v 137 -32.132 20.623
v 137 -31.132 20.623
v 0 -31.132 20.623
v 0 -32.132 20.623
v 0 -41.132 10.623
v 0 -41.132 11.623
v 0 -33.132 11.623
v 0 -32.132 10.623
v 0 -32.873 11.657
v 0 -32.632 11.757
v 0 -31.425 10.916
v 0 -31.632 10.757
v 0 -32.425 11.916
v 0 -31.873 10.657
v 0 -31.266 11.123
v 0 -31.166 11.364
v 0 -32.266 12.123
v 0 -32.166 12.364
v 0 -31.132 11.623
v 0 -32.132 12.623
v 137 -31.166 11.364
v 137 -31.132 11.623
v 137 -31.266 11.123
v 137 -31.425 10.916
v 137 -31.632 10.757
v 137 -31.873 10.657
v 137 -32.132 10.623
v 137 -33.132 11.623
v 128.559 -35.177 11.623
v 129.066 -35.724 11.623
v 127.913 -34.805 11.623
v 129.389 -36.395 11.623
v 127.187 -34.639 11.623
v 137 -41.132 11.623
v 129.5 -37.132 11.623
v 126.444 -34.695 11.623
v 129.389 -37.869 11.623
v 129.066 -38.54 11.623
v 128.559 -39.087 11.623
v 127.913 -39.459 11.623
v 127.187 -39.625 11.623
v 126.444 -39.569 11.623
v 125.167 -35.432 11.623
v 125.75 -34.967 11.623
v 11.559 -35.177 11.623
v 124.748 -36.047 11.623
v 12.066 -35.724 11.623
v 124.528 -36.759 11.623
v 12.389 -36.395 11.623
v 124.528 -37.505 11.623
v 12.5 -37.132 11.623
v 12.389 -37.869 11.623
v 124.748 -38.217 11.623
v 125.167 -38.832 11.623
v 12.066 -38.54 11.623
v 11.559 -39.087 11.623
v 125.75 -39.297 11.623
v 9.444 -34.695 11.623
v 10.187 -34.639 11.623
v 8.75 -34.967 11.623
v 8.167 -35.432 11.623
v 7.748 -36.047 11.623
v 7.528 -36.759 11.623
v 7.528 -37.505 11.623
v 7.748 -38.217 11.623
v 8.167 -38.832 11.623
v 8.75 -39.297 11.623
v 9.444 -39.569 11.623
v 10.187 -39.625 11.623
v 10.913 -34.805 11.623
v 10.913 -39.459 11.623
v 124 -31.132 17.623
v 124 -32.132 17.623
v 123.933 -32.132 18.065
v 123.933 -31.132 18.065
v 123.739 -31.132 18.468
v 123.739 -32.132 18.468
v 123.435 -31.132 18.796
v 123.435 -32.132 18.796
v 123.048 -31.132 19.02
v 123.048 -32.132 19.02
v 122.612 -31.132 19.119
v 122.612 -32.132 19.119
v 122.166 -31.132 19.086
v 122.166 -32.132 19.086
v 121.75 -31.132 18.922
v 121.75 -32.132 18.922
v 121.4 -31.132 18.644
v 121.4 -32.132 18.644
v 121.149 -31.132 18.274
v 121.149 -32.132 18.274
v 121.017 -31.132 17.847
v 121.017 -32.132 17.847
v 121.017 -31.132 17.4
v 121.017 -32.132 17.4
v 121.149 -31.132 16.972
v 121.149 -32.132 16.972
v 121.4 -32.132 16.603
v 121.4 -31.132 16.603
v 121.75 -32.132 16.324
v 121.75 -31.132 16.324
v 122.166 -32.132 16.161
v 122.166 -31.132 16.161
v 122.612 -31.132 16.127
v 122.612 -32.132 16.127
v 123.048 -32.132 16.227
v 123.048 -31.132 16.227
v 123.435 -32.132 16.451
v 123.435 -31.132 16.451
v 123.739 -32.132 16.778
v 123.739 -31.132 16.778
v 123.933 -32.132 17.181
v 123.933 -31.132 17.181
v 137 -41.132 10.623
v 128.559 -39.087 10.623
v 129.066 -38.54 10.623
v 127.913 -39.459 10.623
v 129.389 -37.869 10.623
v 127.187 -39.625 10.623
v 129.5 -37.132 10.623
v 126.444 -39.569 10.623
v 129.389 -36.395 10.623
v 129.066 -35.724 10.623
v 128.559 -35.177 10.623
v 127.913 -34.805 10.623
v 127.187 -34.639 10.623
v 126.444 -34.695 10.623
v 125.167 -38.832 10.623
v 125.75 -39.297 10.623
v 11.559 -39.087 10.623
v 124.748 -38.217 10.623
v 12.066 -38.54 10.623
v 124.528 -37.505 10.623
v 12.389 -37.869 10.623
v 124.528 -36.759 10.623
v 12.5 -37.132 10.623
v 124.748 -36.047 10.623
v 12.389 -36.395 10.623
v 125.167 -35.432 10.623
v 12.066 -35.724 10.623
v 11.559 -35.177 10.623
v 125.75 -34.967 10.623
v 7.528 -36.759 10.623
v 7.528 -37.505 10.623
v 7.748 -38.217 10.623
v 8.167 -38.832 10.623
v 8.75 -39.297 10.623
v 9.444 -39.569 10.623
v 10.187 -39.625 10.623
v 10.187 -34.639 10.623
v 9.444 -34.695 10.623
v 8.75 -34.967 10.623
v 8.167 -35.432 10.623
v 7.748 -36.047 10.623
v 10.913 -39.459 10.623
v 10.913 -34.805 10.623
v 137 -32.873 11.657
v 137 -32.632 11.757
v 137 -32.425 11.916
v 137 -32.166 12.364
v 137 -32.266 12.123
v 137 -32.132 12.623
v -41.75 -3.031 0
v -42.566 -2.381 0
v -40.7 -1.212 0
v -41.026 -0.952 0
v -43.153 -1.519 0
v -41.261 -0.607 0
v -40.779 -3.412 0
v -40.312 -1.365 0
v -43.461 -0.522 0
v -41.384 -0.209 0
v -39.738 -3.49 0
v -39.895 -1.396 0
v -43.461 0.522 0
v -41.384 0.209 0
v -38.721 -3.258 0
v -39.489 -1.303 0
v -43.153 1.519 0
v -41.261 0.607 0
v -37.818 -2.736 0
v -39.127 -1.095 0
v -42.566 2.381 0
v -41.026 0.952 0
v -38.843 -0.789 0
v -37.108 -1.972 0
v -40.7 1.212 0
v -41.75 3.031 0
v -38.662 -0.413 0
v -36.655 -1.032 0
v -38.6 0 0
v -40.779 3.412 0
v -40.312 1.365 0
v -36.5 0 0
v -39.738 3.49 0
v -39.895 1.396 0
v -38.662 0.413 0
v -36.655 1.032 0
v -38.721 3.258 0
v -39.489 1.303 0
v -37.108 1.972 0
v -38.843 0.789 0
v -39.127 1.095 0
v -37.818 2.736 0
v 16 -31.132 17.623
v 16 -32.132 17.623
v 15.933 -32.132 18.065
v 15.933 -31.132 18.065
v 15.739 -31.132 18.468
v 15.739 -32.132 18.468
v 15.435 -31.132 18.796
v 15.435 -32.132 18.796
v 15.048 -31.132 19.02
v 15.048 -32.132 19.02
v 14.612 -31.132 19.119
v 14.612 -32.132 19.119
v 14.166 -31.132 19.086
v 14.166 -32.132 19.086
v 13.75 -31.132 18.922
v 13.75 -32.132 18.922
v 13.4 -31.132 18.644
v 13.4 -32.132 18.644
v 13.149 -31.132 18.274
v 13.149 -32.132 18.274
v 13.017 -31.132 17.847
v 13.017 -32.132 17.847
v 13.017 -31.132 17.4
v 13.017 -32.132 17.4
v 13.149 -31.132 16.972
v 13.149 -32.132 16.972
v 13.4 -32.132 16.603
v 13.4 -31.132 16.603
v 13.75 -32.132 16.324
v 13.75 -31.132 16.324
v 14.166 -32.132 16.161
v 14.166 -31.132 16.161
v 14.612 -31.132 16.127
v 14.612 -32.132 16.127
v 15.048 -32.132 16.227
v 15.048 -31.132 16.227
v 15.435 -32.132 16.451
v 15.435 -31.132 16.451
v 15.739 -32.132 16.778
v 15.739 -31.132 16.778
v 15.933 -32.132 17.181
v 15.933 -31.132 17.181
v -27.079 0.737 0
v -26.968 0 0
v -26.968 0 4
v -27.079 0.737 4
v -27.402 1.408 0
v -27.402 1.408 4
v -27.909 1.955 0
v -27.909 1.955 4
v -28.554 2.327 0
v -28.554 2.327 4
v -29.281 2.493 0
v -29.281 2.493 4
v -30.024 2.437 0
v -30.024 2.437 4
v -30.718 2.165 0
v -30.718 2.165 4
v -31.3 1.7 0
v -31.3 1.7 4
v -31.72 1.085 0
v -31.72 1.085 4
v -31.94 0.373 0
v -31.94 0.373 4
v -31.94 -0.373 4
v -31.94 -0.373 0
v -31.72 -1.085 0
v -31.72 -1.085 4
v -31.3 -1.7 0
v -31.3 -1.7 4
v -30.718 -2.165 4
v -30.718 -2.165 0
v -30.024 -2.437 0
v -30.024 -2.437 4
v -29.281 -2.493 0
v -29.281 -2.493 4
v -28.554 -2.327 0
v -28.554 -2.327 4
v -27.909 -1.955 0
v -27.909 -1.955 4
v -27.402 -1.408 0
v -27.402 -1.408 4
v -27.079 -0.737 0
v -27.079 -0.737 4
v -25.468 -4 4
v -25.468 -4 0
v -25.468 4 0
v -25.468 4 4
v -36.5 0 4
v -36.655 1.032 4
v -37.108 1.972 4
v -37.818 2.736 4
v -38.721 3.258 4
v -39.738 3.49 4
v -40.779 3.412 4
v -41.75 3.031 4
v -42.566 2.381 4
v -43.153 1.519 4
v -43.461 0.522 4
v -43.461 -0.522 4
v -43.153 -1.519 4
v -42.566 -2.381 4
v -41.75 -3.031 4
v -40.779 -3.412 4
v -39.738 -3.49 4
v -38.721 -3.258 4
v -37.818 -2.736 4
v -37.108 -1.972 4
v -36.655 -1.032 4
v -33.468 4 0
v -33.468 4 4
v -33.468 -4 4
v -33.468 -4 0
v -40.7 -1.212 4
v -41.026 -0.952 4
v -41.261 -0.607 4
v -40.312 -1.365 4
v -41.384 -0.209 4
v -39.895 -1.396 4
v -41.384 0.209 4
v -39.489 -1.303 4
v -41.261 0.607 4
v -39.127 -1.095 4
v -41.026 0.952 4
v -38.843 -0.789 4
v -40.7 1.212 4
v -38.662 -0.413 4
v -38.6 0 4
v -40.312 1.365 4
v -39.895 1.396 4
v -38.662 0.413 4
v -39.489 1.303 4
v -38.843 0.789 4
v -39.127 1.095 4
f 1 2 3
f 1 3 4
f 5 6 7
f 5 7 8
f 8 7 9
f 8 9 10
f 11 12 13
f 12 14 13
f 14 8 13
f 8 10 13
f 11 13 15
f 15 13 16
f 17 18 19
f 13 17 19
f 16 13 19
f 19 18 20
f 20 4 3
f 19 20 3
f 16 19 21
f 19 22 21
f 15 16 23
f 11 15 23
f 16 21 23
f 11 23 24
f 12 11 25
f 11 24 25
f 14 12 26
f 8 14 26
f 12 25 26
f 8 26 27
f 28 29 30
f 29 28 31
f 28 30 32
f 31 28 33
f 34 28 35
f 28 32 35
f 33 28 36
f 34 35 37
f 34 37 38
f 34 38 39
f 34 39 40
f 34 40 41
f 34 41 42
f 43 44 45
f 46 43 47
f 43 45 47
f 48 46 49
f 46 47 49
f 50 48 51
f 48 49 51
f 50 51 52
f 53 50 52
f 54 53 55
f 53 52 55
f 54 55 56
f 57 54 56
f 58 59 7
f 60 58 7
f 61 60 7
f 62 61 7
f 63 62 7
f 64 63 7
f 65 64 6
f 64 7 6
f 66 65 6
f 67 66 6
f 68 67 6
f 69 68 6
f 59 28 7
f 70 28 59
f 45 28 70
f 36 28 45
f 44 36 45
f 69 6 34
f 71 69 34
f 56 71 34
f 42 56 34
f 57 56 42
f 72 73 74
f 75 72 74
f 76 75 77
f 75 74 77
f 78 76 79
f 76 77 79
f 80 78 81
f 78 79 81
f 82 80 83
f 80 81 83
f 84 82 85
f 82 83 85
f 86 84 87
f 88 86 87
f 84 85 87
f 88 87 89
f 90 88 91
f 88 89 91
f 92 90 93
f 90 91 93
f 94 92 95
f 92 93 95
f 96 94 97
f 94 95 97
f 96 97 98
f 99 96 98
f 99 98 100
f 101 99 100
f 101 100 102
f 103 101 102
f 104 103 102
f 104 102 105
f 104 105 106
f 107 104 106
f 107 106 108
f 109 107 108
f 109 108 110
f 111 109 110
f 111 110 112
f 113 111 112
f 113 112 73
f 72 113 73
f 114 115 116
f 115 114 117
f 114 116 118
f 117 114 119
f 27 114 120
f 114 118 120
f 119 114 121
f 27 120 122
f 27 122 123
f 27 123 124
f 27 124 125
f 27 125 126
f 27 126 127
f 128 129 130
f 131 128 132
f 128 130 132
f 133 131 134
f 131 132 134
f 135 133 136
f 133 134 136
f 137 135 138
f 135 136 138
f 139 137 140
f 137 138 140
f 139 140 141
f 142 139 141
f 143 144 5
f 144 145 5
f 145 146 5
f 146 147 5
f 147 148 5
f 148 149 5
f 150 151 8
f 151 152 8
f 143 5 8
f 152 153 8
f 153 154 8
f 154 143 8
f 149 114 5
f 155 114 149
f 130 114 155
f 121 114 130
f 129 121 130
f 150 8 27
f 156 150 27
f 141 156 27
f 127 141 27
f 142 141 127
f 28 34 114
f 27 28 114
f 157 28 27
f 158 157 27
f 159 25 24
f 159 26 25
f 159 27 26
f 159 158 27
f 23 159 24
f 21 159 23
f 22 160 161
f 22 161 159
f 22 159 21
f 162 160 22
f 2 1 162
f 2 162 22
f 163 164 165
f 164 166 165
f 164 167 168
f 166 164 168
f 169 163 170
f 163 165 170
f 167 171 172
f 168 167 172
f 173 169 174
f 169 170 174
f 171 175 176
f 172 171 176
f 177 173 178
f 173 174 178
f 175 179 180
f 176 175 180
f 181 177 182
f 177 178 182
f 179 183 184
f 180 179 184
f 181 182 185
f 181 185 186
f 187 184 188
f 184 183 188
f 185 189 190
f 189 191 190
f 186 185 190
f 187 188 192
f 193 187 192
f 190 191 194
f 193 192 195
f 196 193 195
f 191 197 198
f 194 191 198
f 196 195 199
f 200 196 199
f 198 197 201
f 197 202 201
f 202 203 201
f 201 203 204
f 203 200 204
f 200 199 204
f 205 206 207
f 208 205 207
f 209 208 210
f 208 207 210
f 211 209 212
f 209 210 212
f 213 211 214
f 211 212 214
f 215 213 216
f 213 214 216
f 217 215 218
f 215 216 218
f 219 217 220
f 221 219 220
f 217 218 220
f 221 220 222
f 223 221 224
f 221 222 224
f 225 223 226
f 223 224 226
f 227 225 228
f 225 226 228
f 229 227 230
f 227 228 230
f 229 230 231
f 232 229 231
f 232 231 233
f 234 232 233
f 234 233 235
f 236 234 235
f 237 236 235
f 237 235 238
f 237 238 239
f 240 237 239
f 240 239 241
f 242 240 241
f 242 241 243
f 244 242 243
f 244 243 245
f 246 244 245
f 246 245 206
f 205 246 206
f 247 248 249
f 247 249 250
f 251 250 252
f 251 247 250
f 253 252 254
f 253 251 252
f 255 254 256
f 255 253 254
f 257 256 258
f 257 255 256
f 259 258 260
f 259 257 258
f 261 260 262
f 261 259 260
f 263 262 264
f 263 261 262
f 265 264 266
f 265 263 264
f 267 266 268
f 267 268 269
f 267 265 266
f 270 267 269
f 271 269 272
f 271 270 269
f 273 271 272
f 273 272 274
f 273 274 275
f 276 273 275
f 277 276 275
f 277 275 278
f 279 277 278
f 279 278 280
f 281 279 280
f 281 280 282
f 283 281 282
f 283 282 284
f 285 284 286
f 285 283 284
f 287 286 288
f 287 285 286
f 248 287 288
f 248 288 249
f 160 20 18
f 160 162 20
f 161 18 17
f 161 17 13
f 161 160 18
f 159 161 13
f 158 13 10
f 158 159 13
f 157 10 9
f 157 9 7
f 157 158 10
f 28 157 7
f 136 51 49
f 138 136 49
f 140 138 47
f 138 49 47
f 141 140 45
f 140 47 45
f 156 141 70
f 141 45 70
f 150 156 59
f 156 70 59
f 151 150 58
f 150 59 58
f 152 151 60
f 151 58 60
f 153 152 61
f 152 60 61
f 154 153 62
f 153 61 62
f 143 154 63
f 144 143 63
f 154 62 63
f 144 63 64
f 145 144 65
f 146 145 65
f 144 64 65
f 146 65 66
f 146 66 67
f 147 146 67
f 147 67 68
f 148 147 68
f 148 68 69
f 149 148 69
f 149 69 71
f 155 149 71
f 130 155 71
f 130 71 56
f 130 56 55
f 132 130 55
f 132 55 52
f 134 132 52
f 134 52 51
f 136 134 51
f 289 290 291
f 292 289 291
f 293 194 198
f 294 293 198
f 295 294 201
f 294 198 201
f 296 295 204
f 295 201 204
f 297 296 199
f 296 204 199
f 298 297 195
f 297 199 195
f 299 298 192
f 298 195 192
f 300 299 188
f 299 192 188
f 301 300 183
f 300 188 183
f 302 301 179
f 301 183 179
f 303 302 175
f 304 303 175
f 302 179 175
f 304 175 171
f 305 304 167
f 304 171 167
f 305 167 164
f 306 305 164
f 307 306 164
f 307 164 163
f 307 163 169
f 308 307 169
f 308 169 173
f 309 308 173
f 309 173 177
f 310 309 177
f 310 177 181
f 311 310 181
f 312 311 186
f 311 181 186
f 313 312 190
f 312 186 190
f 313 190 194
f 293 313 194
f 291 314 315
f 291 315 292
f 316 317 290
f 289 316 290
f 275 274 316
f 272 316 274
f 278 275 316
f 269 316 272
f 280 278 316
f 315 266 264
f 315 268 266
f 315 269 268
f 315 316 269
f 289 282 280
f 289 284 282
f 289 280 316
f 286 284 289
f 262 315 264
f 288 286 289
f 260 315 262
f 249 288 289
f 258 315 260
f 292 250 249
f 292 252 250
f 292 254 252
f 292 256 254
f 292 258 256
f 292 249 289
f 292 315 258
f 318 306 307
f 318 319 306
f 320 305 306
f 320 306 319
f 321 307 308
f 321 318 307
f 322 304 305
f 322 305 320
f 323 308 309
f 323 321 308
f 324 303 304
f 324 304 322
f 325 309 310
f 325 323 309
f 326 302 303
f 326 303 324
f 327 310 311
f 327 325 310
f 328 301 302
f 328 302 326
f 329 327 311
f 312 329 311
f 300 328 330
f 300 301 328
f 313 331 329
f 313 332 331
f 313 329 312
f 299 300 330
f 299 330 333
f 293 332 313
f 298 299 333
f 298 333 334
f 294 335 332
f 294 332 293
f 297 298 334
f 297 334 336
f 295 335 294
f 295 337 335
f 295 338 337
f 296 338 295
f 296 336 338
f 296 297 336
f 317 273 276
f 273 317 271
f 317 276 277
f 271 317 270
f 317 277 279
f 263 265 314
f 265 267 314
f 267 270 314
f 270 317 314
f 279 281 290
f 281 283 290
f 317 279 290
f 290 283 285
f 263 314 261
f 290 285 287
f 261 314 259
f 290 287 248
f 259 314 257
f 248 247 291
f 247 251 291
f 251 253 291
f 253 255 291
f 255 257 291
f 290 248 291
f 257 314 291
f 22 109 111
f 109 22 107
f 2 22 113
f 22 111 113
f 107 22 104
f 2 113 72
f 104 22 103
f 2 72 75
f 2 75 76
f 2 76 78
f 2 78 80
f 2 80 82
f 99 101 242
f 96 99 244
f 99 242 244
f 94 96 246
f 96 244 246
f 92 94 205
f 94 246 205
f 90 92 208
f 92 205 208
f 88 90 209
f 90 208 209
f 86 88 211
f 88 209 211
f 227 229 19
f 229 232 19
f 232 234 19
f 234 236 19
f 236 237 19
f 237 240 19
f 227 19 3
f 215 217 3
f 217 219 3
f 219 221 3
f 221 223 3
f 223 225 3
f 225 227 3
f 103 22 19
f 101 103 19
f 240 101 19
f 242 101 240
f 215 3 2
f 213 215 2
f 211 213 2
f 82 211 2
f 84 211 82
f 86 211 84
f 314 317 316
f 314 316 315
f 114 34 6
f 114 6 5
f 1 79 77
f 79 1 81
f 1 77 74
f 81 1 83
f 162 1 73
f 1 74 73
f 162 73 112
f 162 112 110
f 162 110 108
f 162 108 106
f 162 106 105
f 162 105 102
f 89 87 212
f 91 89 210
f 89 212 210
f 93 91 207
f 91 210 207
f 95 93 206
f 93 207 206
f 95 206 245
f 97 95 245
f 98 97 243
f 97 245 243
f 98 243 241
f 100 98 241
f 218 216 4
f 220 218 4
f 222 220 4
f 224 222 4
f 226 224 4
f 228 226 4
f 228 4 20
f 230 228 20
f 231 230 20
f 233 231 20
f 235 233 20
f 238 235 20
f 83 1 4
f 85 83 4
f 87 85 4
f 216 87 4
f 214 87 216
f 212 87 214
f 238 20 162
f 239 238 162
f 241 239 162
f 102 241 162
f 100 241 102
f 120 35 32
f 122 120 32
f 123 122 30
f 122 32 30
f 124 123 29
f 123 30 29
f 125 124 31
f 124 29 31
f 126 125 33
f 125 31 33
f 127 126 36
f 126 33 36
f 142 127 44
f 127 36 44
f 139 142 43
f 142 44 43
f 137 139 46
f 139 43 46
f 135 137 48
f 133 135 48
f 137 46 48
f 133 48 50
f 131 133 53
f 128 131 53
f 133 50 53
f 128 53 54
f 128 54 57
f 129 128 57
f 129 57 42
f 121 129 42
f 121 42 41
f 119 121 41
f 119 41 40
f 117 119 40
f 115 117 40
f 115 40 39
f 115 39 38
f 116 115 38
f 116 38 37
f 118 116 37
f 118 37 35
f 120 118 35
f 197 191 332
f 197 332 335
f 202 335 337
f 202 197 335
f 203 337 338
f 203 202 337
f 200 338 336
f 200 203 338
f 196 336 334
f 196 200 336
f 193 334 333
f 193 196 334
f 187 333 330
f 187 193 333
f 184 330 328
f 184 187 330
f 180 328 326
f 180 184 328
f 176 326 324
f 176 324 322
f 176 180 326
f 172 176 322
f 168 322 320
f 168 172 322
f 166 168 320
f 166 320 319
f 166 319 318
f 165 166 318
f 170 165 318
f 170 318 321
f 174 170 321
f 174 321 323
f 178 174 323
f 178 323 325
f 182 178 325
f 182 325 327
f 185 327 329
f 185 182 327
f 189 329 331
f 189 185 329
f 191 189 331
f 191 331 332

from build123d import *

# Parameters (mm, degrees)
F1_DEPTH  = 137
F2_R      = 1.5
F3_DEPTH  = 2
F4_R      = 2.5
F5_DEPTH  = 2
F6_R      = 1
F7_W      = 8
F7_H      = 8
F7_R      = 2.5
F8_DEPTH  = 4
F9_R      = 3.5
F9_R_2    = 1.4
F10_DEPTH = 4


with BuildPart() as f1:
    # F0 (on Right) → F1 (new body)
    with BuildSketch(Plane.YZ):
        Polygon((-31.131944, 10.623299), (-31.131944, 20.623299), (-32.131944, 20.623299), (-32.131944, 11.623299), (-41.131944, 11.623299), (-41.131944, 10.623299), align=None)
    extrude(amount=F1_DEPTH)

    # F2 (on face) → F3 (cut)
    with BuildSketch(Plane.XZ.offset(32.131944)):
        with Locations((14.5, 17.623299)):
            Circle(F2_R)
        with Locations((122.5, 17.623299)):
            Circle(F2_R)
    extrude(amount=-F3_DEPTH, mode=Mode.SUBTRACT)

    # F4 (on face) → F5 (cut)
    with BuildSketch(Plane.XY.offset(11.623299)):
        with Locations((10, -37.131944)):
            Circle(F4_R)
        with Locations((127, -37.131944)):
            Circle(F4_R)
    extrude(amount=-F5_DEPTH, mode=Mode.SUBTRACT)

    # F6
    f6_edges = [f1.edges().sort_by_distance(p)[0] for p in [
        (68.5, -31.131944, 10.623299),
        (68.5, -32.131944, 11.623299),
    ]]
    fillet(f6_edges, radius=F6_R)


with BuildPart() as f8:
    # F7 (on Top) → F8 (new body)
    with BuildSketch(Plane.XY):
        with Locations((-29.467783, 0)):
            Rectangle(F7_W, F7_H)
        with Locations((-29.467783, 0)):
            Circle(F7_R, mode=Mode.SUBTRACT)
    extrude(amount=F8_DEPTH)


with BuildPart() as f10:
    # F9 (on Top) → F10 (new body)
    with BuildSketch(Plane.XY):
        with Locations((-40, 0)):
            Circle(F9_R)
        with Locations((-40, 0)):
            Circle(F9_R_2, mode=Mode.SUBTRACT)
    extrude(amount=F10_DEPTH)


solid = Compound([f1.part, f8.part, f10.part])
